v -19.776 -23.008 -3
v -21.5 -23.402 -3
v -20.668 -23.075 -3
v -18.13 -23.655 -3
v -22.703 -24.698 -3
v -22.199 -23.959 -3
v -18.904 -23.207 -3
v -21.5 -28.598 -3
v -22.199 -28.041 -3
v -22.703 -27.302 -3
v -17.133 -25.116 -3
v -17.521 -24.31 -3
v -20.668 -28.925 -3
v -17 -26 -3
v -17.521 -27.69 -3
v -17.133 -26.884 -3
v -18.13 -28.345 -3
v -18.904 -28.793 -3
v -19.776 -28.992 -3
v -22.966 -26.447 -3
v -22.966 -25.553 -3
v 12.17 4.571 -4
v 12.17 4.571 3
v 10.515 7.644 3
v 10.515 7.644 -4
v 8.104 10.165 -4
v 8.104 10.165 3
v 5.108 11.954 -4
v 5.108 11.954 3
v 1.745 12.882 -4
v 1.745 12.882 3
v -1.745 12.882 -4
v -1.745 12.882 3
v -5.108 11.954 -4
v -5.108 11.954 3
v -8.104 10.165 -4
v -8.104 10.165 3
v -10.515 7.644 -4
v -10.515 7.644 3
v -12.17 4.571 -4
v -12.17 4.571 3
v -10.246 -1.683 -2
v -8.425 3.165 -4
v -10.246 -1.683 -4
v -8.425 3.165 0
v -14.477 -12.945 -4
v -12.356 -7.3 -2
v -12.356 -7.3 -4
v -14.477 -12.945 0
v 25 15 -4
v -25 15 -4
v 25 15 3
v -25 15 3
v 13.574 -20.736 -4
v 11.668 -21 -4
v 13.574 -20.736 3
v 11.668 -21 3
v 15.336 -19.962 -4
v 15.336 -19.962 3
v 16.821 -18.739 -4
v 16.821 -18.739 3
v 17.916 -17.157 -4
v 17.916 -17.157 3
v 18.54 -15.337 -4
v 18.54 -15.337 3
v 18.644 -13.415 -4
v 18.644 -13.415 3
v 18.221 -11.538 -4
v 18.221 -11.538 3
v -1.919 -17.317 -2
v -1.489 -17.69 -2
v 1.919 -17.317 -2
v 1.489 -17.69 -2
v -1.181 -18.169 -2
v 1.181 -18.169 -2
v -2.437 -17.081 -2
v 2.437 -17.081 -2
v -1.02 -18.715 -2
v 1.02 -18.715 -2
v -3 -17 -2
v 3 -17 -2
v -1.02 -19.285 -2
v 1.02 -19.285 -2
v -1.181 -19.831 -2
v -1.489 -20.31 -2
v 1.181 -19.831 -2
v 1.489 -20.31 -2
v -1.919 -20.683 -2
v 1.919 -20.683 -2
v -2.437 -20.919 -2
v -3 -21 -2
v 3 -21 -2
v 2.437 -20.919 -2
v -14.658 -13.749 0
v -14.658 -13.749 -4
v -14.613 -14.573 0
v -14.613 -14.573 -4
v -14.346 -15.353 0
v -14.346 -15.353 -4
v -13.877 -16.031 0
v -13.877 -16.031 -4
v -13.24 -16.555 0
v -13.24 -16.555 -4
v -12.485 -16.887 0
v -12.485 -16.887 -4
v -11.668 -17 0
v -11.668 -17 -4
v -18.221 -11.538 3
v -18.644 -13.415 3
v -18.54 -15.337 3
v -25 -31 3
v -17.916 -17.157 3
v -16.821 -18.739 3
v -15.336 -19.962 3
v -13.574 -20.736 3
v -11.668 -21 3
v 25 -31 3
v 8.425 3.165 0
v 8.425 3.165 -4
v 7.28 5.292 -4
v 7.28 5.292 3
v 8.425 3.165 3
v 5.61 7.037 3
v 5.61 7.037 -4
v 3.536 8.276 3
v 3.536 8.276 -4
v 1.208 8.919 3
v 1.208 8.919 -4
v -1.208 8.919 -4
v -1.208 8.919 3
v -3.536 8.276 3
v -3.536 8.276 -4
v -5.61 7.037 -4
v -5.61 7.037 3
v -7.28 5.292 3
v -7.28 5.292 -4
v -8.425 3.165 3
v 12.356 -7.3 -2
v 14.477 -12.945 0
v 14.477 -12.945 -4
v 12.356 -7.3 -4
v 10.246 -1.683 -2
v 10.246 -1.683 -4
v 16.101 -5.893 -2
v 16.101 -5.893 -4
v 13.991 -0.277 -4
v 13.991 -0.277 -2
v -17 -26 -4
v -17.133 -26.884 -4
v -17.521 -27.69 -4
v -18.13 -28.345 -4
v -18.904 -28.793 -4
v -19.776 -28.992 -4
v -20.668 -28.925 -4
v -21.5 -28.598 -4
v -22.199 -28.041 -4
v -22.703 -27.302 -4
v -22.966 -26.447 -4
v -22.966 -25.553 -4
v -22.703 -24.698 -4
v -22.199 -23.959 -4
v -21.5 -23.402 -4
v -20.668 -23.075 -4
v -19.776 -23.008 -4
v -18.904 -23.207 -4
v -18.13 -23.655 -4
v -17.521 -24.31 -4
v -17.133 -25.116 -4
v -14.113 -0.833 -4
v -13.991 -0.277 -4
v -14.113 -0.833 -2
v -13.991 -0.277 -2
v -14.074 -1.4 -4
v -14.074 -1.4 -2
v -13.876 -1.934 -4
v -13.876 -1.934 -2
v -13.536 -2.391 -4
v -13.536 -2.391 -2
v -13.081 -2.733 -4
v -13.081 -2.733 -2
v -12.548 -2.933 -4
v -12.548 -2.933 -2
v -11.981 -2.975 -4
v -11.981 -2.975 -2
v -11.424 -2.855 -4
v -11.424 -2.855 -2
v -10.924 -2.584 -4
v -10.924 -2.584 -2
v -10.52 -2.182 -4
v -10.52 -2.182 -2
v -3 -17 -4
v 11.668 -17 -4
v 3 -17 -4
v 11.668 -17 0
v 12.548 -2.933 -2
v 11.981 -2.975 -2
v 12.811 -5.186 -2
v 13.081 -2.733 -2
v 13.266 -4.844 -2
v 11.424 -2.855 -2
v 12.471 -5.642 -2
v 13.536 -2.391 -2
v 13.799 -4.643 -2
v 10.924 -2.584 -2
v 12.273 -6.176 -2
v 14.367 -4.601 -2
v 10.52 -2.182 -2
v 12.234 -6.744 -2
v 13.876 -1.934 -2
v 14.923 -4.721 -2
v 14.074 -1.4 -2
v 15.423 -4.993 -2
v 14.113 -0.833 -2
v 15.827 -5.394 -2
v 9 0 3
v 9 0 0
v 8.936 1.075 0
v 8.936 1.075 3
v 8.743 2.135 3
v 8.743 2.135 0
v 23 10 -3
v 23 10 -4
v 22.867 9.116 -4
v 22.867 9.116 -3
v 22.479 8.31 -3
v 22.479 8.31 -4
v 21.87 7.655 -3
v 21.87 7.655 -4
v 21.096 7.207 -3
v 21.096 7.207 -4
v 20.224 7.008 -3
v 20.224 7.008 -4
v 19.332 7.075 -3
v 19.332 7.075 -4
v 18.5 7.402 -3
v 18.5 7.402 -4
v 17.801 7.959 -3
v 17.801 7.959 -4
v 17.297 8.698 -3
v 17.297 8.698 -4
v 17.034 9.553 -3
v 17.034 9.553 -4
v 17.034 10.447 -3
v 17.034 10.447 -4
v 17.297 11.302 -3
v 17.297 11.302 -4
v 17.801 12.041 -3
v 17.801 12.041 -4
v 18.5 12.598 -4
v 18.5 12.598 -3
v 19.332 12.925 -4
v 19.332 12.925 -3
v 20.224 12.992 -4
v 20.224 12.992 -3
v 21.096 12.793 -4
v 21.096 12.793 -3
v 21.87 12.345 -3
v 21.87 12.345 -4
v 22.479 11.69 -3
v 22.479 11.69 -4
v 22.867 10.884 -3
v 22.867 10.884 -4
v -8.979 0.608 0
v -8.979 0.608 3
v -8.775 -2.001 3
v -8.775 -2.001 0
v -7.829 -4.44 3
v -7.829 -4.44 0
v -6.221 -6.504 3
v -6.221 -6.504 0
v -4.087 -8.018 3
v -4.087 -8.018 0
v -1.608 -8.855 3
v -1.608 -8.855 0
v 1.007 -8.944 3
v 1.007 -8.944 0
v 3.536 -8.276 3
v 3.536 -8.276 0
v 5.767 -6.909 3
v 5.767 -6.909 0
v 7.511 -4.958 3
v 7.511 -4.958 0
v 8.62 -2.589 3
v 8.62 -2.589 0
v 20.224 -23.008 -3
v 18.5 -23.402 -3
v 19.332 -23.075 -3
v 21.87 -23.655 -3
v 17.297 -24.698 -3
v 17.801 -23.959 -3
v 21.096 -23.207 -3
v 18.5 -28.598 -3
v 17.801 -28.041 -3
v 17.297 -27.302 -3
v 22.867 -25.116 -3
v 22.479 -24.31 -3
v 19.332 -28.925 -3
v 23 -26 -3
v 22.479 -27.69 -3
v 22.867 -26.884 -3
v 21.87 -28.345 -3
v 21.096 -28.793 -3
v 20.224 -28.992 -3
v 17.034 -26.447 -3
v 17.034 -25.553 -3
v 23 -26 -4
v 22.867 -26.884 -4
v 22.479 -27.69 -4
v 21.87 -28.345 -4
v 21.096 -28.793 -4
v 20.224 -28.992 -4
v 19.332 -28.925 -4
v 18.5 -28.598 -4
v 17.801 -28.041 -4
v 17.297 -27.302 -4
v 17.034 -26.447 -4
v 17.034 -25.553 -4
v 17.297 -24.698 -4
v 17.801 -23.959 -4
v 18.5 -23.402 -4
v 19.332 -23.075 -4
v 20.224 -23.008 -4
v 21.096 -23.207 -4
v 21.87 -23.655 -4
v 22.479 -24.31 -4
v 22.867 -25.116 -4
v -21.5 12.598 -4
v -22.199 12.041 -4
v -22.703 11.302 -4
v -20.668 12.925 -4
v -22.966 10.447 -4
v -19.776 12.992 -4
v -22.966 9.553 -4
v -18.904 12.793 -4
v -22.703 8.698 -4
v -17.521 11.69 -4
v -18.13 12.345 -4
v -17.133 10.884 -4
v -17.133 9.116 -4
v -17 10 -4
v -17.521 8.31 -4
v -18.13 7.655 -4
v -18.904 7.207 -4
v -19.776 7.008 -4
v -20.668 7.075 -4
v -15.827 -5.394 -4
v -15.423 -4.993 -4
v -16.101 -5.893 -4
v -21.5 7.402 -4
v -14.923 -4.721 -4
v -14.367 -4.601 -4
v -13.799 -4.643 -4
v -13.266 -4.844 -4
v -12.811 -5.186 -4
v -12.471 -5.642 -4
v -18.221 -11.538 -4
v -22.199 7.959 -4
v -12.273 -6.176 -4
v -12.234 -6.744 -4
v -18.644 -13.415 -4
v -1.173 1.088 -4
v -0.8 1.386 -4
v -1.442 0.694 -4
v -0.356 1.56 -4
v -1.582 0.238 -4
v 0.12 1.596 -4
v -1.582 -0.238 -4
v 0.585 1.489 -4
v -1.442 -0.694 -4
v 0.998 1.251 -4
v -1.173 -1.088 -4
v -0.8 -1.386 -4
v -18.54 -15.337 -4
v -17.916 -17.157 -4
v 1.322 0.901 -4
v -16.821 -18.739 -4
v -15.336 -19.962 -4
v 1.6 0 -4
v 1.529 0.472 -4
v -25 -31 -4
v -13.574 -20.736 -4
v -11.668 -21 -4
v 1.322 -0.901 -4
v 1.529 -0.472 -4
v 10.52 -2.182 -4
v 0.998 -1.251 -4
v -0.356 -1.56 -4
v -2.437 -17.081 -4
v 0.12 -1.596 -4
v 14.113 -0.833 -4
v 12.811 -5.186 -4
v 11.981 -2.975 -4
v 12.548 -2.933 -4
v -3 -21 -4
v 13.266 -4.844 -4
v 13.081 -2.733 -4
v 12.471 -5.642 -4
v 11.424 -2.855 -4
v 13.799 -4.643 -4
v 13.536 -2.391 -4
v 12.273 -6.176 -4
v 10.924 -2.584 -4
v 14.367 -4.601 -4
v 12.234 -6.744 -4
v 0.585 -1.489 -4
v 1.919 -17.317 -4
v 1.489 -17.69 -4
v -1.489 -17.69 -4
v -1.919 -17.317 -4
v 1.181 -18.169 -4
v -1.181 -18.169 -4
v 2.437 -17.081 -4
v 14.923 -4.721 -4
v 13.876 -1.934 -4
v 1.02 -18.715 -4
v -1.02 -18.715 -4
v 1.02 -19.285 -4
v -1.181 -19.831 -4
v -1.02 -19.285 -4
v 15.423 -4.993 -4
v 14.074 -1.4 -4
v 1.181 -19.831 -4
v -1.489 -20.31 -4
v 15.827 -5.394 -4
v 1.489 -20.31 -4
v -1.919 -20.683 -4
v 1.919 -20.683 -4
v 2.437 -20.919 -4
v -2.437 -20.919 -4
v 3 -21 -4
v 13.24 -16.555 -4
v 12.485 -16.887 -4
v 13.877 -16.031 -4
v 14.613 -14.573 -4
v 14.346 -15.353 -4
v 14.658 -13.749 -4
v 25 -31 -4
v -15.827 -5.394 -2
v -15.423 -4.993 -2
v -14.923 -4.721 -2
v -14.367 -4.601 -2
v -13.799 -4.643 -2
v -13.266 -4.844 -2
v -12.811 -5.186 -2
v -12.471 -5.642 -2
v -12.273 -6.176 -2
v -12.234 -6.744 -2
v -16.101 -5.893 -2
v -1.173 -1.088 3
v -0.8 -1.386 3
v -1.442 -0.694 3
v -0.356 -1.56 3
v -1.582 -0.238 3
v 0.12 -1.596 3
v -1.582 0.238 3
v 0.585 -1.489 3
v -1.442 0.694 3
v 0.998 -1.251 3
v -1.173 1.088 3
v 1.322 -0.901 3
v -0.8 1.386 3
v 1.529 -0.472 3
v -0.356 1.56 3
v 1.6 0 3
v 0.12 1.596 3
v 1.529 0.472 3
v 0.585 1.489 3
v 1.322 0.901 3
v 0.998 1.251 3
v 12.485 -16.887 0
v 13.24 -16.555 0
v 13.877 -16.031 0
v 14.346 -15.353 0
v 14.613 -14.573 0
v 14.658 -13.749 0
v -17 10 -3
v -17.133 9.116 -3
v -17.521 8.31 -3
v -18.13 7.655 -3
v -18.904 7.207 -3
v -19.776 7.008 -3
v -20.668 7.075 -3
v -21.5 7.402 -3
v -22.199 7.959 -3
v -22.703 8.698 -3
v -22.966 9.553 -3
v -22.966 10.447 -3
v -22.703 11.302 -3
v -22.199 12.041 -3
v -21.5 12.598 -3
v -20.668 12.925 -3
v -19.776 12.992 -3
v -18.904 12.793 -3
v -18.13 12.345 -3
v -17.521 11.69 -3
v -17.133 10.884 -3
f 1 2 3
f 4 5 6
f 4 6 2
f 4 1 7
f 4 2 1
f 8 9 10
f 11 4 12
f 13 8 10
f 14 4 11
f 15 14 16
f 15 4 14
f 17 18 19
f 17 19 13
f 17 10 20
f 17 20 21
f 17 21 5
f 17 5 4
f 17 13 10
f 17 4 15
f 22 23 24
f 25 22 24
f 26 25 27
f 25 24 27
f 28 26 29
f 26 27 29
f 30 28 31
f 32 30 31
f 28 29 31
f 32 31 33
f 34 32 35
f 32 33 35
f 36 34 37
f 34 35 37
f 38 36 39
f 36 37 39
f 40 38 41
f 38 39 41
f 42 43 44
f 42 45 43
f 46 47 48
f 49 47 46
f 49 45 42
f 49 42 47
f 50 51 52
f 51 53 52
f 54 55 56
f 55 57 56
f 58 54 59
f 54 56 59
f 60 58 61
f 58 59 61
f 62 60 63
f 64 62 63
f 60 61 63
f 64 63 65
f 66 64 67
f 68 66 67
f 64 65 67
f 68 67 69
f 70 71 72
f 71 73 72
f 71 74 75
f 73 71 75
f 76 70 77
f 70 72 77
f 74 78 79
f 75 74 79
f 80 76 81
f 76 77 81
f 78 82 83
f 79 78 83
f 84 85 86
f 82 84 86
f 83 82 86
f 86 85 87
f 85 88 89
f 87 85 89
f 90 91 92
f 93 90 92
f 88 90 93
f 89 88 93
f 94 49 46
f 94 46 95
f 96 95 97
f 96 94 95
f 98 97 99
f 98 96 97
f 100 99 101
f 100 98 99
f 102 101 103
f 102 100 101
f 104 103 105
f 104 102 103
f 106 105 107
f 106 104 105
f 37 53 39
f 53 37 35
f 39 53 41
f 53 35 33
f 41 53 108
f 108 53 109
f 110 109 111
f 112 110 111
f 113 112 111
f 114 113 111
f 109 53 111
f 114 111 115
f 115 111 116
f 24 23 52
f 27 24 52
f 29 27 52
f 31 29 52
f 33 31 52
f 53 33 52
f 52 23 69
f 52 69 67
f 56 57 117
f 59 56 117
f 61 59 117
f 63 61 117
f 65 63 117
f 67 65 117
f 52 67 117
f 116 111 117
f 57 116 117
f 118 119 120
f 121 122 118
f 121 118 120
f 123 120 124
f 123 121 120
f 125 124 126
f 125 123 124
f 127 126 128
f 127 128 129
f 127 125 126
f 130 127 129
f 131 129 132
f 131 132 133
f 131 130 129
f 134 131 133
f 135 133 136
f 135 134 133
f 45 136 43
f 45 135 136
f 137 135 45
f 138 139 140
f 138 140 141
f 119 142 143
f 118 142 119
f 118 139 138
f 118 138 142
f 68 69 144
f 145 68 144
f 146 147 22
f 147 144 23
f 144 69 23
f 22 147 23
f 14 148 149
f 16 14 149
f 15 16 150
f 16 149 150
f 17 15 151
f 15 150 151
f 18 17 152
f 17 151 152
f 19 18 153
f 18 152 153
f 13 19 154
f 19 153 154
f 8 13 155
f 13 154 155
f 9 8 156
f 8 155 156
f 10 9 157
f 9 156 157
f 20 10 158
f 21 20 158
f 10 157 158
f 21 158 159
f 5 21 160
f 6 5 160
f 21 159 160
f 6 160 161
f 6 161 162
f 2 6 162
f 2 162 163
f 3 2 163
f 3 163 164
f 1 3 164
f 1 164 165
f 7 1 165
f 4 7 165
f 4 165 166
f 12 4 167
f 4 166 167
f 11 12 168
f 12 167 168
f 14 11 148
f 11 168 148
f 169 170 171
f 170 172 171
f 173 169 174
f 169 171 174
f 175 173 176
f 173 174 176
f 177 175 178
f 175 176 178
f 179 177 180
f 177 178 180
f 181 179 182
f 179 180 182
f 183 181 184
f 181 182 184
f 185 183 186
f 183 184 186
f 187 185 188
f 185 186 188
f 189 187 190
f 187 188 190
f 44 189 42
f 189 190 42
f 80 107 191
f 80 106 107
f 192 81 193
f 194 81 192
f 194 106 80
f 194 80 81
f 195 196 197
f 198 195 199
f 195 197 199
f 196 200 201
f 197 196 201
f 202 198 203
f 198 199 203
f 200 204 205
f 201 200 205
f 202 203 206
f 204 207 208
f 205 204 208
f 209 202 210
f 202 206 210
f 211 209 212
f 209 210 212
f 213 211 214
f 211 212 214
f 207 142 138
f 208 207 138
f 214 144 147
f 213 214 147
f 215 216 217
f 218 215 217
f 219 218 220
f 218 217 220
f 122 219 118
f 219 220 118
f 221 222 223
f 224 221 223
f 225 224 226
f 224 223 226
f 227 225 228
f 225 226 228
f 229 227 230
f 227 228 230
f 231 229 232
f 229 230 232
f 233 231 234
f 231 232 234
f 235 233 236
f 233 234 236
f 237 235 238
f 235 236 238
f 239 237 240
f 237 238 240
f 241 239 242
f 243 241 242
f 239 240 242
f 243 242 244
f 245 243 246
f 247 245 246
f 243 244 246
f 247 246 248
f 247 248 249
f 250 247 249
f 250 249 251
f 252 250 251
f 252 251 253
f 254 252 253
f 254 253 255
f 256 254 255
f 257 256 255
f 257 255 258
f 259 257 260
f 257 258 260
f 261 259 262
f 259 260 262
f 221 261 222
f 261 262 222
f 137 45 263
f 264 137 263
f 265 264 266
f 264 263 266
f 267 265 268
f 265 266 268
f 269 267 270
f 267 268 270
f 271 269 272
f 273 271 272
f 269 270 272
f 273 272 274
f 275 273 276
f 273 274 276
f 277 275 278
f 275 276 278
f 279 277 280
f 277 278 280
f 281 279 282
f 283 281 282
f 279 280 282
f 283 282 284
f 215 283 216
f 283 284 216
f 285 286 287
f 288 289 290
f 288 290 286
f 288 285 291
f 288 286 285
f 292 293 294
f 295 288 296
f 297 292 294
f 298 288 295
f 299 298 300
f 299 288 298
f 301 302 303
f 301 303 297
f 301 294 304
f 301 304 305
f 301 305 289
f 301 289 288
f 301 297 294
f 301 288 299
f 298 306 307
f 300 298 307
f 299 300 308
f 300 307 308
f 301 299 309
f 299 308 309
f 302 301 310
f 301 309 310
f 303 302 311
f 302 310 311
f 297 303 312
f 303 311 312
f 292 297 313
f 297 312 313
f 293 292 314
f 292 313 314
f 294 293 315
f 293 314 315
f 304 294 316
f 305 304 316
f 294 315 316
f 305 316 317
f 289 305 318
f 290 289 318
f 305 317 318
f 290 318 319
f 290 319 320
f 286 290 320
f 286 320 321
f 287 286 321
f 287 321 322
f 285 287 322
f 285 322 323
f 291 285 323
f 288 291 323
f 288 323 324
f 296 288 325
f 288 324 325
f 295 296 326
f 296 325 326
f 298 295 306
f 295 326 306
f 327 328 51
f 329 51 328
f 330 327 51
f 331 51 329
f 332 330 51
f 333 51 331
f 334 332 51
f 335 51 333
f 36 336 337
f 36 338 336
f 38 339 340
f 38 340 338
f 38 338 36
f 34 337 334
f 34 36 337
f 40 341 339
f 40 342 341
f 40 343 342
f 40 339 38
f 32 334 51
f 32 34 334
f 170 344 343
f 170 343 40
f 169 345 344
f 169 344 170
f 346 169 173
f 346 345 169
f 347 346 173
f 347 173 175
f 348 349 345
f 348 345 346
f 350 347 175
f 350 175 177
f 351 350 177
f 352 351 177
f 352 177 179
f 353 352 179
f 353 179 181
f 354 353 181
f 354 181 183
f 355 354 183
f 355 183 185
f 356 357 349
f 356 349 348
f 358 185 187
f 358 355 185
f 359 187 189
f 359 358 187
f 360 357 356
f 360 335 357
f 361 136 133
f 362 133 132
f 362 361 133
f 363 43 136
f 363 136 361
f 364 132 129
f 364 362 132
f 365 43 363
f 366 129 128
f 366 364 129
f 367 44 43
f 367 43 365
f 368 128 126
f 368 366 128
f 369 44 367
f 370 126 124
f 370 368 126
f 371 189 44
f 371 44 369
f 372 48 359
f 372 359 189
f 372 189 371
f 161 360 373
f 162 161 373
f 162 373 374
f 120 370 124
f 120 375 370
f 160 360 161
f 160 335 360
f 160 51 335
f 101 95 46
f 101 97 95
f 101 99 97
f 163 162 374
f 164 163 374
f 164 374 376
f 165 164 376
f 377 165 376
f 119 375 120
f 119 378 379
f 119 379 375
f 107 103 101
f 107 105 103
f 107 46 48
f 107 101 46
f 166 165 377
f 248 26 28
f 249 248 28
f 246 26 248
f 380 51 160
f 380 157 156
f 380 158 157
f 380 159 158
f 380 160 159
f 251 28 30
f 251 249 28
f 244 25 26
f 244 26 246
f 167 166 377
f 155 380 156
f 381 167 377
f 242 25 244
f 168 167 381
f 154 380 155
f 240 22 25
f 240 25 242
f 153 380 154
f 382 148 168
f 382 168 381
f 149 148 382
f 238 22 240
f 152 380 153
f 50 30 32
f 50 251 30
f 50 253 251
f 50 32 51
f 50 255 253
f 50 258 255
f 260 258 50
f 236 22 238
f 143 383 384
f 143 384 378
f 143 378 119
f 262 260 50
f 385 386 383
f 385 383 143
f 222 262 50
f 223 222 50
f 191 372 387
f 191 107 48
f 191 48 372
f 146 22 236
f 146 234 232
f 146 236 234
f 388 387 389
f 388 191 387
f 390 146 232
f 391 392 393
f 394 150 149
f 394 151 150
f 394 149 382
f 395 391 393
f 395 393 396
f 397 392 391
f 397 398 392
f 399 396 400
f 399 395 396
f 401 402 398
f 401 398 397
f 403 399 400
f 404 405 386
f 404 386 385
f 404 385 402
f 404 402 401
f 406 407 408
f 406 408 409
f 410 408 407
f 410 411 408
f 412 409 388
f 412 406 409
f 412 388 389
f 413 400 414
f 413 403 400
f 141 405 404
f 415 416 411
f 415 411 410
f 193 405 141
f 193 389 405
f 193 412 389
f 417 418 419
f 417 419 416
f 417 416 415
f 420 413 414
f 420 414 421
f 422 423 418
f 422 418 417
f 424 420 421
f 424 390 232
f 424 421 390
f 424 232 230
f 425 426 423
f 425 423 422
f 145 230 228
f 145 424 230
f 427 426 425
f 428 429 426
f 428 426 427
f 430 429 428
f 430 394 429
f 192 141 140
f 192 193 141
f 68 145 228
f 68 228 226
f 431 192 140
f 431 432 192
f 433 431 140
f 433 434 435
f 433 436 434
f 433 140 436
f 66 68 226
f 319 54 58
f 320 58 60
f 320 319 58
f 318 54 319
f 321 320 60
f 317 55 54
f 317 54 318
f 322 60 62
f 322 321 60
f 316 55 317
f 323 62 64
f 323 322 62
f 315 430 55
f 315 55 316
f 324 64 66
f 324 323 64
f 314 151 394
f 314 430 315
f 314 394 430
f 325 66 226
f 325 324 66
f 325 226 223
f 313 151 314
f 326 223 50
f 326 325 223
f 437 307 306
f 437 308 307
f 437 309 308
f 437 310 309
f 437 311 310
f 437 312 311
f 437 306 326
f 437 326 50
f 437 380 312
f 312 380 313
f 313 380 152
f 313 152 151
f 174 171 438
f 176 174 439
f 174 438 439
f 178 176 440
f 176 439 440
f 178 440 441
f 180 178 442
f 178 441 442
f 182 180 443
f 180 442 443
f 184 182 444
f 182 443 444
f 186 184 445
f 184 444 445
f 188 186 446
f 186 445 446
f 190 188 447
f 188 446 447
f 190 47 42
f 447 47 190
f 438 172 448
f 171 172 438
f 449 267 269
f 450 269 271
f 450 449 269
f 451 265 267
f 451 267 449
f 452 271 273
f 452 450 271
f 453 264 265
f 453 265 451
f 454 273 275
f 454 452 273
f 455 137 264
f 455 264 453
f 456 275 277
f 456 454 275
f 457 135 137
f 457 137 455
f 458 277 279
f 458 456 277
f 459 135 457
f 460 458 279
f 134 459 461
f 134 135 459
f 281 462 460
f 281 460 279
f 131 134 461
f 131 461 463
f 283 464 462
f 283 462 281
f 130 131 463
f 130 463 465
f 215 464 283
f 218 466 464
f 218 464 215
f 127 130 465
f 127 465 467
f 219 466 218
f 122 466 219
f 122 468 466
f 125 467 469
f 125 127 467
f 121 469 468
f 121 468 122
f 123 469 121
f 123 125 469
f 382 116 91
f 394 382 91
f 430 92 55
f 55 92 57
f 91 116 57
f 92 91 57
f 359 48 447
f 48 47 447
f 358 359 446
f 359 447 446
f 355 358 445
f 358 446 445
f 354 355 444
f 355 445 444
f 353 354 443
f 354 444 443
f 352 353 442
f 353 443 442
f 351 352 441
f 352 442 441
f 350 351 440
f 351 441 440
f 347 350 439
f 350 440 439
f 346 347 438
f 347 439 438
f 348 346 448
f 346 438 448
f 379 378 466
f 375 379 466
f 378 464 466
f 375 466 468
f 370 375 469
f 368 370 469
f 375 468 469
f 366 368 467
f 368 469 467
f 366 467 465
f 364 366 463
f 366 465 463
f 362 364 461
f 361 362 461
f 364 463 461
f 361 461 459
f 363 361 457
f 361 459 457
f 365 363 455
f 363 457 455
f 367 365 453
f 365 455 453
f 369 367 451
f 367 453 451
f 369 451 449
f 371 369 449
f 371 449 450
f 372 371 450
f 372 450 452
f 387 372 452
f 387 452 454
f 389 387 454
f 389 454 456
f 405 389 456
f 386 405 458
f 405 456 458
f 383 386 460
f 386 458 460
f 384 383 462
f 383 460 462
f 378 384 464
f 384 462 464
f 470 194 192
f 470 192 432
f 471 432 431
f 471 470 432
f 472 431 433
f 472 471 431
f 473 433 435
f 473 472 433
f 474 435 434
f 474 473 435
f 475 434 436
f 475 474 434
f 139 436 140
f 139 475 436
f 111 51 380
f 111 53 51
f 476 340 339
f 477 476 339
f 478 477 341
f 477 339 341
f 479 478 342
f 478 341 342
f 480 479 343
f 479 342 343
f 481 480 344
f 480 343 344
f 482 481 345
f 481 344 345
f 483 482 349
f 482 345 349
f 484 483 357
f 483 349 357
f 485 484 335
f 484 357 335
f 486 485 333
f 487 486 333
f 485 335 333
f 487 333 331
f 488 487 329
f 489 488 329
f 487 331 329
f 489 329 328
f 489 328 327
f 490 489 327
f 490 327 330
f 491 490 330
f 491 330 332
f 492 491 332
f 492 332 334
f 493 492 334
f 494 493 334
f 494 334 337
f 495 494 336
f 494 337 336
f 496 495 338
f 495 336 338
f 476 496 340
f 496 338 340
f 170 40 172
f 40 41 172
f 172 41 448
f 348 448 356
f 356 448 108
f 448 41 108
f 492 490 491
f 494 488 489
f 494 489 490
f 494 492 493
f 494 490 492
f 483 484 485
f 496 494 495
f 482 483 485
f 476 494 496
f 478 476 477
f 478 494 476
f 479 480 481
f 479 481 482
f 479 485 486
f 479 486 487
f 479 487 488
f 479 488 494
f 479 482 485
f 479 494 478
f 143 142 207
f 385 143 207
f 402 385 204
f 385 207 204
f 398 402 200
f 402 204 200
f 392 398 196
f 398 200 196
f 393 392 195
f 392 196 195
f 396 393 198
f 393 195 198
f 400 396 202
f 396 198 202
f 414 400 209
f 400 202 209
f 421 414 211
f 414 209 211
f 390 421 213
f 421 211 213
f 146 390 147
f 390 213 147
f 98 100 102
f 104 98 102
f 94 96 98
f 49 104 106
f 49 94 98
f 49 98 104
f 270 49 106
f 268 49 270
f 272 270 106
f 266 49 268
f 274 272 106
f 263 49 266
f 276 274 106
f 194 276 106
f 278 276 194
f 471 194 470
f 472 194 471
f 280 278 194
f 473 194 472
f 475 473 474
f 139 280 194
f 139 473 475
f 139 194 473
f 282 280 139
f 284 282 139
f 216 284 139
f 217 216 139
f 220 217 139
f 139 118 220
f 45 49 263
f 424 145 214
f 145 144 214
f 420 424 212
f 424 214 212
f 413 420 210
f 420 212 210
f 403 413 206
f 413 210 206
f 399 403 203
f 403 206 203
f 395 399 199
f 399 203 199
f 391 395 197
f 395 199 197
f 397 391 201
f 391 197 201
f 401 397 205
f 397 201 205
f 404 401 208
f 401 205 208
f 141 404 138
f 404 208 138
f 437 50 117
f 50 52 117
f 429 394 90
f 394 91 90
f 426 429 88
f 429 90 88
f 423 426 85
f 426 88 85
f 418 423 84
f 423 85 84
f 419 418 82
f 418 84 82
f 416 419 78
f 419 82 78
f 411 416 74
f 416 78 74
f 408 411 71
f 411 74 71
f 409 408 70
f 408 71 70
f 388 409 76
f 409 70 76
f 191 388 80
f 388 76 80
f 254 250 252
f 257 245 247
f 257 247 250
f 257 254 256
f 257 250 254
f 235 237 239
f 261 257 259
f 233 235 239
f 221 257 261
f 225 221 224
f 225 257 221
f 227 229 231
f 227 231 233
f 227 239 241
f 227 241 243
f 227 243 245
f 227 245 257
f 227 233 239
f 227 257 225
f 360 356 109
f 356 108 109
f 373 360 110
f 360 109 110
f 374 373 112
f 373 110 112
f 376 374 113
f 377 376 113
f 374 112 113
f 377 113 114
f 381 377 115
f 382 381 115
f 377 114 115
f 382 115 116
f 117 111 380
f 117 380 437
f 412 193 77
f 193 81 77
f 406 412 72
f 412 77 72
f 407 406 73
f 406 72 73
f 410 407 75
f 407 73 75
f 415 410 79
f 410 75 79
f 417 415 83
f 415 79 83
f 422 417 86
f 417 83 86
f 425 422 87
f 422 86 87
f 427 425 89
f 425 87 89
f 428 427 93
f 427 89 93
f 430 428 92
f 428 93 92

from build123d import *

# Parameters (mm, degrees)
F0_R     = 1.6
F1_DEPTH = 3
F2_DEPTH = 3
F3_W     = 50
F3_H     = 46
F4_DEPTH = 6
F6_DEPTH = 1
F7_DEPTH = 1
F8_R     = 3
F9_DEPTH = 1


with BuildPart() as f1:
    # F0 (on Top) → F1 (new body)
    with BuildSketch(Plane.XY):
        with BuildLine():
            ThreePointArc((-8.4251758935, 3.1648714292), (-1.6083247431, -8.8551279788), (9, 0))
            ThreePointArc((9, 0), (8.8551279788, 1.6083247431), (8.4251758935, 3.1648714292))
            ThreePointArc((8.4251758935, 3.1648714292), (0, 9), (-8.4251758935, 3.1648714292))
        make_face()
        Circle(F0_R, mode=Mode.SUBTRACT)
        with BuildLine():
            ThreePointArc((8.4251758935, 3.1648714292), (8.8551279788, 1.6083247431), (9, 0))
            ThreePointArc((9, 0), (-1.6083247431, -8.8551279788), (-8.4251758935, 3.1648714292))
            Line((-8.4251758935, 3.1648714292), (-14.4767774381, -12.9450428569))
            ThreePointArc((-14.4767774381, -12.9450428569), (-14.1346449317, -15.7080879033), (-11.6683854736, -17))
            Line((-11.6683854736, -17), (0, -17))
            Line((0, -17), (11.6683854736, -17))
            ThreePointArc((11.6683854736, -17), (14.1346449317, -15.7080879033), (14.4767774381, -12.9450428569))
            Line((14.4767774381, -12.9450428569), (8.4251758935, 3.1648714292))
        make_face()
    extrude(amount=-F1_DEPTH)

    # F0 (on Top) → F2 (join)
    with BuildSketch(Plane.XY):
        with BuildLine():
            ThreePointArc((-8.4251758935, 3.1648714292), (-1.6083247431, -8.8551279788), (9, 0))
            ThreePointArc((9, 0), (8.8551279788, 1.6083247431), (8.4251758935, 3.1648714292))
            ThreePointArc((8.4251758935, 3.1648714292), (0, 9), (-8.4251758935, 3.1648714292))
        make_face()
        Circle(F0_R, mode=Mode.SUBTRACT)
    extrude(amount=F2_DEPTH)



with BuildPart() as f4:
    # F3 (on face) → F4 (new body, through all)
    with BuildSketch(Plane(origin=(0, 0, -3), x_dir=(1, 0, 0), z_dir=(0, 0, -1))):
        with Locations((0, 8)):
            Rectangle(F3_W, F3_H)
        with BuildLine():
            Line((-12.1696985129, -4.5714809533), (-18.2213000575, 11.5384333329))
            ThreePointArc((-18.2213000575, 11.5384333329), (-17.4229908758, 17.985538441), (-11.6683854736, 21))
            Line((-11.6683854736, 21), (11.6683854736, 21))
            ThreePointArc((11.6683854736, 21), (17.4229908758, 17.985538441), (18.2213000575, 11.5384333329))
            Line((18.2213000575, 11.5384333329), (12.1696985129, -4.5714809533))
            ThreePointArc((12.1696985129, -4.5714809533), (0, -13), (-12.1696985129, -4.5714809533))
        make_face(mode=Mode.SUBTRACT)
    extrude(amount=-F4_DEPTH)


with BuildPart() as f1_1:
    add(f1.part)

    add(f4.part)  # F6 merges F4
    # F5 (on face) → F6 (join)
    with BuildSketch(Plane(origin=(0, 0, -3), x_dir=(1, 0, 0), z_dir=(0, 0, -1))):
        with BuildLine():
            Line((-10.2463335535, 1.683216071), (-12.3562478397, 7.3))
            ThreePointArc((-12.3562478397, 7.3), (-13.5252043873, 4.7244339283), (-16.100770459, 5.8933904759))
            Line((-16.100770459, 5.8933904759), (-13.9908561729, 0.2766065469))
            ThreePointArc((-13.9908561729, 0.2766065469), (-12.8218996253, 2.8521726186), (-10.2463335535, 1.683216071))
        make_face()
        with BuildLine():
            ThreePointArc((-3, 21), (-1, 19), (-3, 17))
            Line((-3, 17), (3, 17))
            ThreePointArc((3, 17), (1, 19), (3, 21))
            Line((3, 21), (-3, 21))
        make_face()
        with BuildLine():
            Line((12.3562478397, 7.3), (10.2463335535, 1.683216071))
            ThreePointArc((10.2463335535, 1.683216071), (12.8218996253, 2.8521726186), (13.9908561729, 0.2766065469))
            Line((13.9908561729, 0.2766065469), (16.100770459, 5.8933904759))
            ThreePointArc((16.100770459, 5.8933904759), (13.5252043873, 4.7244339283), (12.3562478397, 7.3))
        make_face()
    extrude(amount=-F6_DEPTH)

    # F7 (add): a face of the model
    f7_faces = [f1_1.faces().sort_by_distance(p)[0] for p in [
        (0, -8.3665022997, -3),
    ]]
    extrude(f7_faces, amount=F7_DEPTH)

    # F8 (on face) → F9 (cut)
    with BuildSketch(Plane(origin=(0, 0, -4), x_dir=(1, 0, 0), z_dir=(0, 0, -1))):
        with Locations((-20, 26)):
            Circle(F8_R)
        with Locations((20, 26)):
            Circle(F8_R)
        with Locations((20, -10)):
            Circle(F8_R)
        with Locations((-20, -10)):
            Circle(F8_R)
    extrude(amount=-F9_DEPTH, mode=Mode.SUBTRACT)


solid = f1_1.part
